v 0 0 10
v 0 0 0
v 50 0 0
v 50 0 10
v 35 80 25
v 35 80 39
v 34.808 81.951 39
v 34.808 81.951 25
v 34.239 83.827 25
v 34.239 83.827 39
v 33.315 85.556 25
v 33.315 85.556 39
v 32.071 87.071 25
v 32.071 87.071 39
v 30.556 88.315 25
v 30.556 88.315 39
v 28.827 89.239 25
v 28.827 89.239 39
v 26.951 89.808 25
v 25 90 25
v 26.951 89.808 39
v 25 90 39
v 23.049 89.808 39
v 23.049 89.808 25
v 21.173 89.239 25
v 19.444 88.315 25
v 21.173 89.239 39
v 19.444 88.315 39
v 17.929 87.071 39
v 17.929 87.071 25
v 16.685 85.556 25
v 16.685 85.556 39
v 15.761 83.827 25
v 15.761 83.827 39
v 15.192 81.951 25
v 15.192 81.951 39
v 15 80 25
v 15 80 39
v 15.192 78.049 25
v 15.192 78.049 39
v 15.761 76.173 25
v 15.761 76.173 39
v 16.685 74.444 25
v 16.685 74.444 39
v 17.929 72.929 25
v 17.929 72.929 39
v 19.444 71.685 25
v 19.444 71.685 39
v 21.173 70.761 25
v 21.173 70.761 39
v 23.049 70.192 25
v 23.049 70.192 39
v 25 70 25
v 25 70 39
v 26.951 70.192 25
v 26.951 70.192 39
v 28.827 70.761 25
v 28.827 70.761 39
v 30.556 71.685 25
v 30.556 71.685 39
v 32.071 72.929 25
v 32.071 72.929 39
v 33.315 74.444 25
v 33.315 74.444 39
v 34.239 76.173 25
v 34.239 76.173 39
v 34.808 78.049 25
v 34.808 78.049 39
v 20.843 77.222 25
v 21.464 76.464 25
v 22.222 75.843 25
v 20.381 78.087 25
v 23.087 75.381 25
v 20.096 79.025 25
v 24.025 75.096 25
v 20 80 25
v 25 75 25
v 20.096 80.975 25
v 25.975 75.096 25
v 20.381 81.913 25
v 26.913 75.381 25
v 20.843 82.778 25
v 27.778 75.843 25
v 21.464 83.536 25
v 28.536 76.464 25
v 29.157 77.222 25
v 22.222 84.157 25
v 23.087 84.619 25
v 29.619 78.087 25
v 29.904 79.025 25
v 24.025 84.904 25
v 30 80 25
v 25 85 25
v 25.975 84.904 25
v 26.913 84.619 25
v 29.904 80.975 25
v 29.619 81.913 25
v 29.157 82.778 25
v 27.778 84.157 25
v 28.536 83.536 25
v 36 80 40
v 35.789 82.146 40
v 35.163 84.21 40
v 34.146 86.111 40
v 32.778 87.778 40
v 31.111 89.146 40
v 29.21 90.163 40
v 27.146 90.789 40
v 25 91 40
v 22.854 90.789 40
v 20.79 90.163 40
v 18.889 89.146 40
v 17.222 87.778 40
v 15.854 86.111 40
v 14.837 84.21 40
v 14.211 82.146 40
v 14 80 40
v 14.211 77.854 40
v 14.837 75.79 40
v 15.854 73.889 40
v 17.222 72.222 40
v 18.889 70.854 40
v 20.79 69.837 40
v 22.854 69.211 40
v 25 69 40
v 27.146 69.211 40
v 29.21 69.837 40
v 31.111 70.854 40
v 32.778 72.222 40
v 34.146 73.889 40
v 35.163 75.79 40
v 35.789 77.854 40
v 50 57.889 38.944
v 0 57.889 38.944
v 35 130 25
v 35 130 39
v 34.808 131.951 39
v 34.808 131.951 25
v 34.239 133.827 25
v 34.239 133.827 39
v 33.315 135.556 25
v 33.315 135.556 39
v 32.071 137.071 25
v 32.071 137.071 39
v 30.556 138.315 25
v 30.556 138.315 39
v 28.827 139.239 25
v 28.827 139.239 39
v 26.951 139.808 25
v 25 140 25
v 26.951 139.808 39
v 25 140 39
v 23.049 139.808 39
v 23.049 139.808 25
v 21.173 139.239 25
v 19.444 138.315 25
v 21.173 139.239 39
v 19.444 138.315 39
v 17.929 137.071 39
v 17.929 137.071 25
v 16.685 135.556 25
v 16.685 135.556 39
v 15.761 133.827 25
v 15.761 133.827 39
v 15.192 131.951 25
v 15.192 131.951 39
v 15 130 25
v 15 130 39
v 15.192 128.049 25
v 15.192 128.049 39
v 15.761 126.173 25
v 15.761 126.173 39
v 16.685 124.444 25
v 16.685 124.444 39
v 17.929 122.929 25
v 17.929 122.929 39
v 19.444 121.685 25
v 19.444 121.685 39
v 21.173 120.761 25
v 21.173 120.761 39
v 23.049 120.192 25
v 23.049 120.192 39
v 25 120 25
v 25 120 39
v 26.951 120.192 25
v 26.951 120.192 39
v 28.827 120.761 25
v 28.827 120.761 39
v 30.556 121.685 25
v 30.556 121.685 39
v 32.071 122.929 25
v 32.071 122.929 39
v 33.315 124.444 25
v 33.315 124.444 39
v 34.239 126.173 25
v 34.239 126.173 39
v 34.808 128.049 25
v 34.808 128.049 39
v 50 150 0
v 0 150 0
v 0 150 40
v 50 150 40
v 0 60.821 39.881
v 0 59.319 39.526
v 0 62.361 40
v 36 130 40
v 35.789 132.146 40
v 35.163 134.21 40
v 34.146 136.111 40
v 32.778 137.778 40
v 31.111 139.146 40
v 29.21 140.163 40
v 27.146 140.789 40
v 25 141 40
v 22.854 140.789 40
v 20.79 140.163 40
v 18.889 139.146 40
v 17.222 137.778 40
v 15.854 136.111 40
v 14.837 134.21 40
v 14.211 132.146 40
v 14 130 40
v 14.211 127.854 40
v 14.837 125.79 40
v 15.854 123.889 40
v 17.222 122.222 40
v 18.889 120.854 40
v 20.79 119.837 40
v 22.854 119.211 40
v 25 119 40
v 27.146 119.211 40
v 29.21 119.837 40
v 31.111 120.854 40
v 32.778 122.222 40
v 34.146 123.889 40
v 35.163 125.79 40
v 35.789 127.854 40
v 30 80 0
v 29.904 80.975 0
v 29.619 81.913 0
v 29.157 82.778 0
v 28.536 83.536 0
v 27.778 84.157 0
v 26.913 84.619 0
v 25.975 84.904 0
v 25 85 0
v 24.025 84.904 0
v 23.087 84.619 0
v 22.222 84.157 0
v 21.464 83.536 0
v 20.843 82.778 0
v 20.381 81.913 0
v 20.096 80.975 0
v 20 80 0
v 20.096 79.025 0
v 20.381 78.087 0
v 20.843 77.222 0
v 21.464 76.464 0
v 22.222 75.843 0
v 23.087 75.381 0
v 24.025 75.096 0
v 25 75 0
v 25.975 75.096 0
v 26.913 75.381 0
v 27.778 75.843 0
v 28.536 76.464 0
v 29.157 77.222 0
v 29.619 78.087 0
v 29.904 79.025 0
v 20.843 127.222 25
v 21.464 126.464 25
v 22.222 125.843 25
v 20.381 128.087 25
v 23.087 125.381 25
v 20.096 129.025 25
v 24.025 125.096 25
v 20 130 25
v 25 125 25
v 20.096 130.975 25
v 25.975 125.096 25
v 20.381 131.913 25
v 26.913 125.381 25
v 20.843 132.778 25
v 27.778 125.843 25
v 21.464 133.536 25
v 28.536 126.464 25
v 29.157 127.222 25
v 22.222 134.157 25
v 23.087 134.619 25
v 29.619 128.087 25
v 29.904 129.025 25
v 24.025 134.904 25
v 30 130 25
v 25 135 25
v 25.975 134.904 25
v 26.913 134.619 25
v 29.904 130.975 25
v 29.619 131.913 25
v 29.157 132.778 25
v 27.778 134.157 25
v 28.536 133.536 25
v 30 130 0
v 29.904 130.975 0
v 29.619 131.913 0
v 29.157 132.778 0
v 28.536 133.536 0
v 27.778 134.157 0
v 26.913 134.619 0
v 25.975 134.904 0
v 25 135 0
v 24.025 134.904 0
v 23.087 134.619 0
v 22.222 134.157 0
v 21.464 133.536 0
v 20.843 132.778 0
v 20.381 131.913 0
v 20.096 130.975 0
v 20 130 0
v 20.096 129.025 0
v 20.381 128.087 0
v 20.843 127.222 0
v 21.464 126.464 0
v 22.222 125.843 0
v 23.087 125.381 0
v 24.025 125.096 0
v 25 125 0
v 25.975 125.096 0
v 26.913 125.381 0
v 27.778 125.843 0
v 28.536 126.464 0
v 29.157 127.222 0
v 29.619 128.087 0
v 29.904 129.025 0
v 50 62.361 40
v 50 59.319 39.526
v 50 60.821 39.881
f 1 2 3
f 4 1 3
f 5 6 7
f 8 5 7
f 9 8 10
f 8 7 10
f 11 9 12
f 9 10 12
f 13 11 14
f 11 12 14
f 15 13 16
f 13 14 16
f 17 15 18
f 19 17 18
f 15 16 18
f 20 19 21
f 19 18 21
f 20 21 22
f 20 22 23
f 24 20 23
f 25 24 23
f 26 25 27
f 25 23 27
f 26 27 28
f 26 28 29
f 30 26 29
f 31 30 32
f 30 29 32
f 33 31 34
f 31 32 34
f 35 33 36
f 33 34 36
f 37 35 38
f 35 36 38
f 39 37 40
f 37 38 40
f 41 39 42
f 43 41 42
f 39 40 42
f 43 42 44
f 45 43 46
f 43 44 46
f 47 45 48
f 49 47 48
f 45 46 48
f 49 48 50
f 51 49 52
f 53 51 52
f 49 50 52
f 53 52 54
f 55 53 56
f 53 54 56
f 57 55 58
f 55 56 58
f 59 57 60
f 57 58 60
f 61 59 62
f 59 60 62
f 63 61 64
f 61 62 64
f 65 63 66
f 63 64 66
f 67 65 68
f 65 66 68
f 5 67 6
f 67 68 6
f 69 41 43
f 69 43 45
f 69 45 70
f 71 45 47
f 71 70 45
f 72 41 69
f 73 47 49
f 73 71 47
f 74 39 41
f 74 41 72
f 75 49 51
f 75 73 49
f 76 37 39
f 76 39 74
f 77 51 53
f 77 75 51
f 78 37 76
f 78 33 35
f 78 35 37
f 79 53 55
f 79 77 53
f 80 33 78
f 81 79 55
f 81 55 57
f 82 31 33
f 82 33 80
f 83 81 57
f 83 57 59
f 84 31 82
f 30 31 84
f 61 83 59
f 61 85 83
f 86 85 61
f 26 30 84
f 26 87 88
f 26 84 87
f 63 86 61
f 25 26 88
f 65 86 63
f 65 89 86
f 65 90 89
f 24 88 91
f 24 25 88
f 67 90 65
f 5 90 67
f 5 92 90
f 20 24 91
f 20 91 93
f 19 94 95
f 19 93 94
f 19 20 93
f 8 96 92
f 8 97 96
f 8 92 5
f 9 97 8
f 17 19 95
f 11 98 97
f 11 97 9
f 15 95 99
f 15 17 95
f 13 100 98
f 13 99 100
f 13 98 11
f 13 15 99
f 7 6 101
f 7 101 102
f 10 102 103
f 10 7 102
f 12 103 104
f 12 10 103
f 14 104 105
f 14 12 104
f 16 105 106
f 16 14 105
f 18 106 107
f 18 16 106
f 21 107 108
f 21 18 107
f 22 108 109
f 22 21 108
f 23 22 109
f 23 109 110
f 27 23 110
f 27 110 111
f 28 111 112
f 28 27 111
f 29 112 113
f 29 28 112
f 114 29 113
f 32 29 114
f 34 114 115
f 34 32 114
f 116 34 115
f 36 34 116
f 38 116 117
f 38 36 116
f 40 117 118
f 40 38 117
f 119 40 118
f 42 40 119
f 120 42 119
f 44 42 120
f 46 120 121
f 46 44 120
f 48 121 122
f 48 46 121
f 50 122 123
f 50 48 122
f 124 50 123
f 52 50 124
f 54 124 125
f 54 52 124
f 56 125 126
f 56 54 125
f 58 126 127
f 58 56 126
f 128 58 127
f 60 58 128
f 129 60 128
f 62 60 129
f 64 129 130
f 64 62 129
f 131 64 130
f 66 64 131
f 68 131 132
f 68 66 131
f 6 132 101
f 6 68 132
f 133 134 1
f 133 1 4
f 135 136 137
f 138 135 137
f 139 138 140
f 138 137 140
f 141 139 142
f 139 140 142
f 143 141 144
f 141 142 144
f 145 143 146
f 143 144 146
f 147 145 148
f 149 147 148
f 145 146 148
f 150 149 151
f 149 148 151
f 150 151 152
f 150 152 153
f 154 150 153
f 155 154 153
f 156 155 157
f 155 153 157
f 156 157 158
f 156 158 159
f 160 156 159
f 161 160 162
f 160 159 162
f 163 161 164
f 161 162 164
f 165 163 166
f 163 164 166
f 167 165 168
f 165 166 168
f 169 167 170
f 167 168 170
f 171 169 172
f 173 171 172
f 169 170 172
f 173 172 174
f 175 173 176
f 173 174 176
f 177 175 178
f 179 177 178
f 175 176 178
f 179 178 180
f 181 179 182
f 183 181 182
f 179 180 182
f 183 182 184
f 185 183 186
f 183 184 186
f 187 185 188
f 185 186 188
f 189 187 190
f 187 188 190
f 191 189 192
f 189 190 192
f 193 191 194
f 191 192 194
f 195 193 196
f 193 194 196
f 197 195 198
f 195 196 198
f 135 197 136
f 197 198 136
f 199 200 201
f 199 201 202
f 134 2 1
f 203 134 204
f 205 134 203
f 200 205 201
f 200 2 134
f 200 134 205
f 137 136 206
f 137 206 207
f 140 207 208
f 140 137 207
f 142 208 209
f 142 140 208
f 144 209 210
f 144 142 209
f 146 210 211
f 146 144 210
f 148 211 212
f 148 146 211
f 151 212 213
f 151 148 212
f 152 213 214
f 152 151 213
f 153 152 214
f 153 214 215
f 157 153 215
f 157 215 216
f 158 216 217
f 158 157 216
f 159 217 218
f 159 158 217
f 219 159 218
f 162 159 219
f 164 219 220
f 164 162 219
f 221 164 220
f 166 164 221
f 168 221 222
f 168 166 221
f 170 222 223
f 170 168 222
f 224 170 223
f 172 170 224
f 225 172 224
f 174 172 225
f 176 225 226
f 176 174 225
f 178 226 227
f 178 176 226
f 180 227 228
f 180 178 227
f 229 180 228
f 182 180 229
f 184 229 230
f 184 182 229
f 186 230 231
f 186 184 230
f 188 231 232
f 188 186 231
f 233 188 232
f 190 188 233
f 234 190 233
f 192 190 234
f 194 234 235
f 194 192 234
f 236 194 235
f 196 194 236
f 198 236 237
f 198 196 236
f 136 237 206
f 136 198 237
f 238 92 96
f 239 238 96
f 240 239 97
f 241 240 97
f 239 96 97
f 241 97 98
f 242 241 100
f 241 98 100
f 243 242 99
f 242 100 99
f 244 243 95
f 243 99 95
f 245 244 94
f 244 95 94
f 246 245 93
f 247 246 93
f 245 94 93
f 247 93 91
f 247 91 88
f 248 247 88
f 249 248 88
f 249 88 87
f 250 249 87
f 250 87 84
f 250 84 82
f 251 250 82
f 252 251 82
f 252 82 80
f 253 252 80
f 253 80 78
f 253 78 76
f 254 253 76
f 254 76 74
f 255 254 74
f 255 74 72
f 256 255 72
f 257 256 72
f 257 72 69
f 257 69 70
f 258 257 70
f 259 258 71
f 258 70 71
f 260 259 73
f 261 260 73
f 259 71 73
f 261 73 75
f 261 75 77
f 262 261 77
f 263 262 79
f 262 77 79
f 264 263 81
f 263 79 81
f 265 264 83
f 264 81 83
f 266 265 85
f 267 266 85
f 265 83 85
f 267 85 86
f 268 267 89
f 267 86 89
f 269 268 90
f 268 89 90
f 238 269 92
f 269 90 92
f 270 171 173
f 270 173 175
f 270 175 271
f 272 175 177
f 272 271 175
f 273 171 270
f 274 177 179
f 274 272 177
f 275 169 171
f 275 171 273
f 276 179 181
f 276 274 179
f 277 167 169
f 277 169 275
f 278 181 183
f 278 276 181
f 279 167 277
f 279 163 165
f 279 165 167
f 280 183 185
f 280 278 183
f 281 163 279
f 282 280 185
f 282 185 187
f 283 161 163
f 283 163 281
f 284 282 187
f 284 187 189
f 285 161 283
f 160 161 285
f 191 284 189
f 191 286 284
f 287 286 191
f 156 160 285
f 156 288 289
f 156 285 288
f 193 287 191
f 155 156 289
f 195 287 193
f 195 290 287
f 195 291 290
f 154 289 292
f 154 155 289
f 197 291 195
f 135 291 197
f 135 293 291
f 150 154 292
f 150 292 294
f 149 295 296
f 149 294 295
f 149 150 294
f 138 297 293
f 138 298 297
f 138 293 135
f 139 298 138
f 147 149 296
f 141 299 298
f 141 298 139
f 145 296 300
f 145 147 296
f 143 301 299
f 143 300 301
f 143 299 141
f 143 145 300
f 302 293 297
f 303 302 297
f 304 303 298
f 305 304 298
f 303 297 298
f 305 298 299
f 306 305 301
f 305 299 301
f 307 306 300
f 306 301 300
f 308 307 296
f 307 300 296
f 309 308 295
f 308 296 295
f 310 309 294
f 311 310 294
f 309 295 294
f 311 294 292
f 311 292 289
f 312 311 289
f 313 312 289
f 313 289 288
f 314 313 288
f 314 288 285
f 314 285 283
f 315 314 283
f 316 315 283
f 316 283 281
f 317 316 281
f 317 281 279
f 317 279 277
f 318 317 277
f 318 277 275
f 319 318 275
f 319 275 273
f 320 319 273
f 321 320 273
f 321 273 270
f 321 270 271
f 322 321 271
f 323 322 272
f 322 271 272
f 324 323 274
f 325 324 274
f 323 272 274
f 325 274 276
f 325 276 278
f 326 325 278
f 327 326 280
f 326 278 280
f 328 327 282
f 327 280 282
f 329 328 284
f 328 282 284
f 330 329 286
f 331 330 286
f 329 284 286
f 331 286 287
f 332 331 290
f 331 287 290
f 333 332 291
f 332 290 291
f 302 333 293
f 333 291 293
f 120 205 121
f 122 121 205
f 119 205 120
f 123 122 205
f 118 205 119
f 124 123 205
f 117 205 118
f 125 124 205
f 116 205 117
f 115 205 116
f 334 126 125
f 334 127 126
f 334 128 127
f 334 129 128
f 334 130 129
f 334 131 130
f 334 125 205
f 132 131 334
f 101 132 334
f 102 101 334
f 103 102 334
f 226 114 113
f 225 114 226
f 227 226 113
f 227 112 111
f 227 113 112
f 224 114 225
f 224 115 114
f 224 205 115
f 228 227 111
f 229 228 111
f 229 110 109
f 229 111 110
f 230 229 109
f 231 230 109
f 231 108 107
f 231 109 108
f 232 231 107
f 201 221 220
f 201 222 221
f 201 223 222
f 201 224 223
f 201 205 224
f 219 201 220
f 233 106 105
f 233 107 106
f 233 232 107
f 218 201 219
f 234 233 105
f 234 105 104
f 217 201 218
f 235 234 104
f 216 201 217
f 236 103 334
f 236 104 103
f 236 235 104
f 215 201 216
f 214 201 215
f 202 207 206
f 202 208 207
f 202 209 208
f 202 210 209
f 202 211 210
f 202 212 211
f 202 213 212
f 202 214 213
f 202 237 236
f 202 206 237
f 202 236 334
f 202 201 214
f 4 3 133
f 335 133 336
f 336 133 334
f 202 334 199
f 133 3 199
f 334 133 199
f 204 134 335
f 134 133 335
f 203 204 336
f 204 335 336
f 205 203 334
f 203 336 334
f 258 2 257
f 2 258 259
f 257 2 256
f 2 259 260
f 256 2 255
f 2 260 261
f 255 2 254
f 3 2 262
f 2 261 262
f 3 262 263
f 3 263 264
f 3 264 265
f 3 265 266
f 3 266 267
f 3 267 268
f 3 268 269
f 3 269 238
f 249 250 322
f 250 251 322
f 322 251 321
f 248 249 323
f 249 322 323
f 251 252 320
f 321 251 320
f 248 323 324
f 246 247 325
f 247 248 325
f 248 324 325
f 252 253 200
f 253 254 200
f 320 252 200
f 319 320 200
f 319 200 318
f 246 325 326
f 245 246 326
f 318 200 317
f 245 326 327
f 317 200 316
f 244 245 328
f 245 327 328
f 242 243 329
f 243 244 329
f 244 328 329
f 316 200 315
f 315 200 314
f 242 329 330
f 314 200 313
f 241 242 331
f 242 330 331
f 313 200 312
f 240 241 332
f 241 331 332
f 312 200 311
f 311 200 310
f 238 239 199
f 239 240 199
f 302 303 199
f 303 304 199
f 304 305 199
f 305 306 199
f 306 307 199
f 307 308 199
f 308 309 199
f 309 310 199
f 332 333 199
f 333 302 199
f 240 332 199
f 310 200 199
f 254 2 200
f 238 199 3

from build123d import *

# Parameters (mm, degrees)
SKETCH_1_W          = 50
SKETCH_1_H          = 150
EXTRUDE_1_DEPTH     = 40
CHAMFER_1_SIZE      = 30
CHAMFER_1_SIZE2     = 60
FILLET_1_R          = 10
SKETCH_2_R          = 10
CUT_EXTRUDE_1_DEPTH = 15
CHAMFER_2_SIZE      = 1
SKETCH_3_R          = 5
CUT_EXTRUDE_2_DEPTH = 26


with BuildPart() as part:
    # 草图1 → 凸台-拉伸1 (new body)
    with BuildSketch(Plane.XY):
        with Locations((25, 75)):
            Rectangle(SKETCH_1_W, SKETCH_1_H)
    extrude(amount=EXTRUDE_1_DEPTH)

    # 倒角1
    chamfer_1_edges = [part.edges().sort_by_distance(p)[0] for p in [
        (25, 0, 40),
    ]]
    chamfer_1_side = [part.faces().sort_by_distance(p)[0] for p in [
        (25, 0, 20),
    ]]
    chamfer(chamfer_1_edges, length=CHAMFER_1_SIZE, length2=CHAMFER_1_SIZE2, reference=chamfer_1_side[0])

    # 圆角1
    fillet_1_edges = [part.edges().sort_by_distance(p)[0] for p in [
        (25, 60, 40),
    ]]
    fillet(fillet_1_edges, radius=FILLET_1_R)

    # 草图2 → 切除-拉伸1 (cut)
    with BuildSketch(Plane.XY.offset(40)):
        with Locations((25, 130)):
            Circle(SKETCH_2_R)
        with Locations((25, 80)):
            Circle(SKETCH_2_R)
    extrude(amount=-CUT_EXTRUDE_1_DEPTH, mode=Mode.SUBTRACT)

    # 倒角2
    chamfer_2_edges = [part.edges().sort_by_distance(p)[0] for p in [
        (15, 130, 40),
        (15, 80, 40),
    ]]
    chamfer(chamfer_2_edges, length=CHAMFER_2_SIZE)

    # 草图3 → 切除-拉伸2 (cut, through all)
    with BuildSketch(Plane.XY.offset(25)):
        with Locations((25, 130)):
            Circle(SKETCH_3_R)
        with Locations((25, 80)):
            Circle(SKETCH_3_R)
    extrude(amount=-CUT_EXTRUDE_2_DEPTH, mode=Mode.SUBTRACT)


solid = part.part
